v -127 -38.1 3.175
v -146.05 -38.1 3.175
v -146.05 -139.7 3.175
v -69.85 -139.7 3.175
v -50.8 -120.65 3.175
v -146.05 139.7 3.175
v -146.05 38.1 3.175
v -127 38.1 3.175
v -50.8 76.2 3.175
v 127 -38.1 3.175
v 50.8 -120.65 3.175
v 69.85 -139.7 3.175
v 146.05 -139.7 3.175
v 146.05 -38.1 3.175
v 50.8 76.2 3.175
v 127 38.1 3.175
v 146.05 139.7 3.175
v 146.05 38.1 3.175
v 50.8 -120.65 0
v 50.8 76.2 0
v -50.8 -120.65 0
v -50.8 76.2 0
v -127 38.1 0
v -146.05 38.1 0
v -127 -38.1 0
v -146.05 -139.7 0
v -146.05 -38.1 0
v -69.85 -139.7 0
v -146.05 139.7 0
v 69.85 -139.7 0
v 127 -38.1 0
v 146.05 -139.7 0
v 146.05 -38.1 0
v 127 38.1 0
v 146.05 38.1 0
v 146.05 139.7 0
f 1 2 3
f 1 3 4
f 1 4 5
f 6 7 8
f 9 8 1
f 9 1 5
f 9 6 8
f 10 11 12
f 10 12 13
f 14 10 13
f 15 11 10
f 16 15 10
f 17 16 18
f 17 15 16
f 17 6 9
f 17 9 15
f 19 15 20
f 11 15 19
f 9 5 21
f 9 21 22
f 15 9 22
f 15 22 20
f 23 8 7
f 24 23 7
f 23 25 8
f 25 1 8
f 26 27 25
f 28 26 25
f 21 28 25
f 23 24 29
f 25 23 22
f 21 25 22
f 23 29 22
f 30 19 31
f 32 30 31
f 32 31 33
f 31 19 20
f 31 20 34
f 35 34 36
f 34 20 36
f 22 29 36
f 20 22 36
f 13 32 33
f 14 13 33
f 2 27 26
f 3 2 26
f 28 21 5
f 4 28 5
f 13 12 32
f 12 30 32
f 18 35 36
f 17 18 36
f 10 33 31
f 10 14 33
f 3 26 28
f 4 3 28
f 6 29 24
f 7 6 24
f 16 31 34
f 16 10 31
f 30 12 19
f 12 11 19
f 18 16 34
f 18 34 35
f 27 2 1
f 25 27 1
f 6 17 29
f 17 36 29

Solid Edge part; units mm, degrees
sketch "Sketch1" plane through (0, 0, 0) normal (0, 0, 1) x (1, 0, 0)
  line L0 (-146.05, 139.7) -> (-146.05, -139.7)
  line L1 (-146.05, -139.7) -> (146.05, -139.7)
  line L2 (146.05, -139.7) -> (146.05, 139.7)
  line L3 (146.05, 139.7) -> (-146.05, 139.7)
  dimension "D1" = 292.1
  dimension "D2" = 279.4
extrude "Protrusion1" add sketch "Sketch1" along normal blind 3.175
sketch "Sketch2" plane through (0, 0, 3.175) normal (0, 0, 1) x (1, 0, 0)
  line L0 (-50.8, -139.7) -> (-50.8, 76.2)
  line L1 (-50.8, 76.2) -> (50.8, 76.2)
  line L2 (50.8, 76.2) -> (50.8, -139.7)
  line L3 (50.8, -139.7) -> (-50.8, -139.7)
  dimension "D1" = 215.9
  dimension "D2" = 101.6
extrude "Cutout1" cut sketch "Sketch2" against normal up to next
chamfer "Chamfer_1" distance 19.05 angle 45 2 edges at (-50.8, -139.7, 1.5875) (50.8, -139.7, 1.5875)
sketch "Sketch3" plane through (0, 0, 3.175) normal (0, 0, 1) x (1, 0, 0)
  line L0 (-146.05, 38.1) -> (-146.05, -38.1)
  line L1 (-146.05, -38.1) -> (-127, -38.1)
  line L2 (-127, -38.1) -> (-127, 38.1)
  line L3 (-127, 38.1) -> (-146.05, 38.1)
  dimension "D1" = 19.05
  dimension "D2" = 76.2
  dimension "D3" = 101.6
extrude "Cutout2" cut sketch "Sketch3" against normal up to next
sketch "Sketch4" plane through (0, 0, 3.175) normal (0, 0, 1) x (1, 0, 0)
  line L0 (146.05, 38.1) -> (146.05, -38.1)
  line L1 (146.05, -38.1) -> (127, -38.1)
  line L2 (127, -38.1) -> (127, 38.1)
  line L3 (127, 38.1) -> (146.05, 38.1)
  dimension "D1" = 19.05
  dimension "D2" = 76.2
  dimension "D3" = 101.6
extrude "Cutout3" cut sketch "Sketch4" against normal up to next
properties part number "SPaRC-01-005"
